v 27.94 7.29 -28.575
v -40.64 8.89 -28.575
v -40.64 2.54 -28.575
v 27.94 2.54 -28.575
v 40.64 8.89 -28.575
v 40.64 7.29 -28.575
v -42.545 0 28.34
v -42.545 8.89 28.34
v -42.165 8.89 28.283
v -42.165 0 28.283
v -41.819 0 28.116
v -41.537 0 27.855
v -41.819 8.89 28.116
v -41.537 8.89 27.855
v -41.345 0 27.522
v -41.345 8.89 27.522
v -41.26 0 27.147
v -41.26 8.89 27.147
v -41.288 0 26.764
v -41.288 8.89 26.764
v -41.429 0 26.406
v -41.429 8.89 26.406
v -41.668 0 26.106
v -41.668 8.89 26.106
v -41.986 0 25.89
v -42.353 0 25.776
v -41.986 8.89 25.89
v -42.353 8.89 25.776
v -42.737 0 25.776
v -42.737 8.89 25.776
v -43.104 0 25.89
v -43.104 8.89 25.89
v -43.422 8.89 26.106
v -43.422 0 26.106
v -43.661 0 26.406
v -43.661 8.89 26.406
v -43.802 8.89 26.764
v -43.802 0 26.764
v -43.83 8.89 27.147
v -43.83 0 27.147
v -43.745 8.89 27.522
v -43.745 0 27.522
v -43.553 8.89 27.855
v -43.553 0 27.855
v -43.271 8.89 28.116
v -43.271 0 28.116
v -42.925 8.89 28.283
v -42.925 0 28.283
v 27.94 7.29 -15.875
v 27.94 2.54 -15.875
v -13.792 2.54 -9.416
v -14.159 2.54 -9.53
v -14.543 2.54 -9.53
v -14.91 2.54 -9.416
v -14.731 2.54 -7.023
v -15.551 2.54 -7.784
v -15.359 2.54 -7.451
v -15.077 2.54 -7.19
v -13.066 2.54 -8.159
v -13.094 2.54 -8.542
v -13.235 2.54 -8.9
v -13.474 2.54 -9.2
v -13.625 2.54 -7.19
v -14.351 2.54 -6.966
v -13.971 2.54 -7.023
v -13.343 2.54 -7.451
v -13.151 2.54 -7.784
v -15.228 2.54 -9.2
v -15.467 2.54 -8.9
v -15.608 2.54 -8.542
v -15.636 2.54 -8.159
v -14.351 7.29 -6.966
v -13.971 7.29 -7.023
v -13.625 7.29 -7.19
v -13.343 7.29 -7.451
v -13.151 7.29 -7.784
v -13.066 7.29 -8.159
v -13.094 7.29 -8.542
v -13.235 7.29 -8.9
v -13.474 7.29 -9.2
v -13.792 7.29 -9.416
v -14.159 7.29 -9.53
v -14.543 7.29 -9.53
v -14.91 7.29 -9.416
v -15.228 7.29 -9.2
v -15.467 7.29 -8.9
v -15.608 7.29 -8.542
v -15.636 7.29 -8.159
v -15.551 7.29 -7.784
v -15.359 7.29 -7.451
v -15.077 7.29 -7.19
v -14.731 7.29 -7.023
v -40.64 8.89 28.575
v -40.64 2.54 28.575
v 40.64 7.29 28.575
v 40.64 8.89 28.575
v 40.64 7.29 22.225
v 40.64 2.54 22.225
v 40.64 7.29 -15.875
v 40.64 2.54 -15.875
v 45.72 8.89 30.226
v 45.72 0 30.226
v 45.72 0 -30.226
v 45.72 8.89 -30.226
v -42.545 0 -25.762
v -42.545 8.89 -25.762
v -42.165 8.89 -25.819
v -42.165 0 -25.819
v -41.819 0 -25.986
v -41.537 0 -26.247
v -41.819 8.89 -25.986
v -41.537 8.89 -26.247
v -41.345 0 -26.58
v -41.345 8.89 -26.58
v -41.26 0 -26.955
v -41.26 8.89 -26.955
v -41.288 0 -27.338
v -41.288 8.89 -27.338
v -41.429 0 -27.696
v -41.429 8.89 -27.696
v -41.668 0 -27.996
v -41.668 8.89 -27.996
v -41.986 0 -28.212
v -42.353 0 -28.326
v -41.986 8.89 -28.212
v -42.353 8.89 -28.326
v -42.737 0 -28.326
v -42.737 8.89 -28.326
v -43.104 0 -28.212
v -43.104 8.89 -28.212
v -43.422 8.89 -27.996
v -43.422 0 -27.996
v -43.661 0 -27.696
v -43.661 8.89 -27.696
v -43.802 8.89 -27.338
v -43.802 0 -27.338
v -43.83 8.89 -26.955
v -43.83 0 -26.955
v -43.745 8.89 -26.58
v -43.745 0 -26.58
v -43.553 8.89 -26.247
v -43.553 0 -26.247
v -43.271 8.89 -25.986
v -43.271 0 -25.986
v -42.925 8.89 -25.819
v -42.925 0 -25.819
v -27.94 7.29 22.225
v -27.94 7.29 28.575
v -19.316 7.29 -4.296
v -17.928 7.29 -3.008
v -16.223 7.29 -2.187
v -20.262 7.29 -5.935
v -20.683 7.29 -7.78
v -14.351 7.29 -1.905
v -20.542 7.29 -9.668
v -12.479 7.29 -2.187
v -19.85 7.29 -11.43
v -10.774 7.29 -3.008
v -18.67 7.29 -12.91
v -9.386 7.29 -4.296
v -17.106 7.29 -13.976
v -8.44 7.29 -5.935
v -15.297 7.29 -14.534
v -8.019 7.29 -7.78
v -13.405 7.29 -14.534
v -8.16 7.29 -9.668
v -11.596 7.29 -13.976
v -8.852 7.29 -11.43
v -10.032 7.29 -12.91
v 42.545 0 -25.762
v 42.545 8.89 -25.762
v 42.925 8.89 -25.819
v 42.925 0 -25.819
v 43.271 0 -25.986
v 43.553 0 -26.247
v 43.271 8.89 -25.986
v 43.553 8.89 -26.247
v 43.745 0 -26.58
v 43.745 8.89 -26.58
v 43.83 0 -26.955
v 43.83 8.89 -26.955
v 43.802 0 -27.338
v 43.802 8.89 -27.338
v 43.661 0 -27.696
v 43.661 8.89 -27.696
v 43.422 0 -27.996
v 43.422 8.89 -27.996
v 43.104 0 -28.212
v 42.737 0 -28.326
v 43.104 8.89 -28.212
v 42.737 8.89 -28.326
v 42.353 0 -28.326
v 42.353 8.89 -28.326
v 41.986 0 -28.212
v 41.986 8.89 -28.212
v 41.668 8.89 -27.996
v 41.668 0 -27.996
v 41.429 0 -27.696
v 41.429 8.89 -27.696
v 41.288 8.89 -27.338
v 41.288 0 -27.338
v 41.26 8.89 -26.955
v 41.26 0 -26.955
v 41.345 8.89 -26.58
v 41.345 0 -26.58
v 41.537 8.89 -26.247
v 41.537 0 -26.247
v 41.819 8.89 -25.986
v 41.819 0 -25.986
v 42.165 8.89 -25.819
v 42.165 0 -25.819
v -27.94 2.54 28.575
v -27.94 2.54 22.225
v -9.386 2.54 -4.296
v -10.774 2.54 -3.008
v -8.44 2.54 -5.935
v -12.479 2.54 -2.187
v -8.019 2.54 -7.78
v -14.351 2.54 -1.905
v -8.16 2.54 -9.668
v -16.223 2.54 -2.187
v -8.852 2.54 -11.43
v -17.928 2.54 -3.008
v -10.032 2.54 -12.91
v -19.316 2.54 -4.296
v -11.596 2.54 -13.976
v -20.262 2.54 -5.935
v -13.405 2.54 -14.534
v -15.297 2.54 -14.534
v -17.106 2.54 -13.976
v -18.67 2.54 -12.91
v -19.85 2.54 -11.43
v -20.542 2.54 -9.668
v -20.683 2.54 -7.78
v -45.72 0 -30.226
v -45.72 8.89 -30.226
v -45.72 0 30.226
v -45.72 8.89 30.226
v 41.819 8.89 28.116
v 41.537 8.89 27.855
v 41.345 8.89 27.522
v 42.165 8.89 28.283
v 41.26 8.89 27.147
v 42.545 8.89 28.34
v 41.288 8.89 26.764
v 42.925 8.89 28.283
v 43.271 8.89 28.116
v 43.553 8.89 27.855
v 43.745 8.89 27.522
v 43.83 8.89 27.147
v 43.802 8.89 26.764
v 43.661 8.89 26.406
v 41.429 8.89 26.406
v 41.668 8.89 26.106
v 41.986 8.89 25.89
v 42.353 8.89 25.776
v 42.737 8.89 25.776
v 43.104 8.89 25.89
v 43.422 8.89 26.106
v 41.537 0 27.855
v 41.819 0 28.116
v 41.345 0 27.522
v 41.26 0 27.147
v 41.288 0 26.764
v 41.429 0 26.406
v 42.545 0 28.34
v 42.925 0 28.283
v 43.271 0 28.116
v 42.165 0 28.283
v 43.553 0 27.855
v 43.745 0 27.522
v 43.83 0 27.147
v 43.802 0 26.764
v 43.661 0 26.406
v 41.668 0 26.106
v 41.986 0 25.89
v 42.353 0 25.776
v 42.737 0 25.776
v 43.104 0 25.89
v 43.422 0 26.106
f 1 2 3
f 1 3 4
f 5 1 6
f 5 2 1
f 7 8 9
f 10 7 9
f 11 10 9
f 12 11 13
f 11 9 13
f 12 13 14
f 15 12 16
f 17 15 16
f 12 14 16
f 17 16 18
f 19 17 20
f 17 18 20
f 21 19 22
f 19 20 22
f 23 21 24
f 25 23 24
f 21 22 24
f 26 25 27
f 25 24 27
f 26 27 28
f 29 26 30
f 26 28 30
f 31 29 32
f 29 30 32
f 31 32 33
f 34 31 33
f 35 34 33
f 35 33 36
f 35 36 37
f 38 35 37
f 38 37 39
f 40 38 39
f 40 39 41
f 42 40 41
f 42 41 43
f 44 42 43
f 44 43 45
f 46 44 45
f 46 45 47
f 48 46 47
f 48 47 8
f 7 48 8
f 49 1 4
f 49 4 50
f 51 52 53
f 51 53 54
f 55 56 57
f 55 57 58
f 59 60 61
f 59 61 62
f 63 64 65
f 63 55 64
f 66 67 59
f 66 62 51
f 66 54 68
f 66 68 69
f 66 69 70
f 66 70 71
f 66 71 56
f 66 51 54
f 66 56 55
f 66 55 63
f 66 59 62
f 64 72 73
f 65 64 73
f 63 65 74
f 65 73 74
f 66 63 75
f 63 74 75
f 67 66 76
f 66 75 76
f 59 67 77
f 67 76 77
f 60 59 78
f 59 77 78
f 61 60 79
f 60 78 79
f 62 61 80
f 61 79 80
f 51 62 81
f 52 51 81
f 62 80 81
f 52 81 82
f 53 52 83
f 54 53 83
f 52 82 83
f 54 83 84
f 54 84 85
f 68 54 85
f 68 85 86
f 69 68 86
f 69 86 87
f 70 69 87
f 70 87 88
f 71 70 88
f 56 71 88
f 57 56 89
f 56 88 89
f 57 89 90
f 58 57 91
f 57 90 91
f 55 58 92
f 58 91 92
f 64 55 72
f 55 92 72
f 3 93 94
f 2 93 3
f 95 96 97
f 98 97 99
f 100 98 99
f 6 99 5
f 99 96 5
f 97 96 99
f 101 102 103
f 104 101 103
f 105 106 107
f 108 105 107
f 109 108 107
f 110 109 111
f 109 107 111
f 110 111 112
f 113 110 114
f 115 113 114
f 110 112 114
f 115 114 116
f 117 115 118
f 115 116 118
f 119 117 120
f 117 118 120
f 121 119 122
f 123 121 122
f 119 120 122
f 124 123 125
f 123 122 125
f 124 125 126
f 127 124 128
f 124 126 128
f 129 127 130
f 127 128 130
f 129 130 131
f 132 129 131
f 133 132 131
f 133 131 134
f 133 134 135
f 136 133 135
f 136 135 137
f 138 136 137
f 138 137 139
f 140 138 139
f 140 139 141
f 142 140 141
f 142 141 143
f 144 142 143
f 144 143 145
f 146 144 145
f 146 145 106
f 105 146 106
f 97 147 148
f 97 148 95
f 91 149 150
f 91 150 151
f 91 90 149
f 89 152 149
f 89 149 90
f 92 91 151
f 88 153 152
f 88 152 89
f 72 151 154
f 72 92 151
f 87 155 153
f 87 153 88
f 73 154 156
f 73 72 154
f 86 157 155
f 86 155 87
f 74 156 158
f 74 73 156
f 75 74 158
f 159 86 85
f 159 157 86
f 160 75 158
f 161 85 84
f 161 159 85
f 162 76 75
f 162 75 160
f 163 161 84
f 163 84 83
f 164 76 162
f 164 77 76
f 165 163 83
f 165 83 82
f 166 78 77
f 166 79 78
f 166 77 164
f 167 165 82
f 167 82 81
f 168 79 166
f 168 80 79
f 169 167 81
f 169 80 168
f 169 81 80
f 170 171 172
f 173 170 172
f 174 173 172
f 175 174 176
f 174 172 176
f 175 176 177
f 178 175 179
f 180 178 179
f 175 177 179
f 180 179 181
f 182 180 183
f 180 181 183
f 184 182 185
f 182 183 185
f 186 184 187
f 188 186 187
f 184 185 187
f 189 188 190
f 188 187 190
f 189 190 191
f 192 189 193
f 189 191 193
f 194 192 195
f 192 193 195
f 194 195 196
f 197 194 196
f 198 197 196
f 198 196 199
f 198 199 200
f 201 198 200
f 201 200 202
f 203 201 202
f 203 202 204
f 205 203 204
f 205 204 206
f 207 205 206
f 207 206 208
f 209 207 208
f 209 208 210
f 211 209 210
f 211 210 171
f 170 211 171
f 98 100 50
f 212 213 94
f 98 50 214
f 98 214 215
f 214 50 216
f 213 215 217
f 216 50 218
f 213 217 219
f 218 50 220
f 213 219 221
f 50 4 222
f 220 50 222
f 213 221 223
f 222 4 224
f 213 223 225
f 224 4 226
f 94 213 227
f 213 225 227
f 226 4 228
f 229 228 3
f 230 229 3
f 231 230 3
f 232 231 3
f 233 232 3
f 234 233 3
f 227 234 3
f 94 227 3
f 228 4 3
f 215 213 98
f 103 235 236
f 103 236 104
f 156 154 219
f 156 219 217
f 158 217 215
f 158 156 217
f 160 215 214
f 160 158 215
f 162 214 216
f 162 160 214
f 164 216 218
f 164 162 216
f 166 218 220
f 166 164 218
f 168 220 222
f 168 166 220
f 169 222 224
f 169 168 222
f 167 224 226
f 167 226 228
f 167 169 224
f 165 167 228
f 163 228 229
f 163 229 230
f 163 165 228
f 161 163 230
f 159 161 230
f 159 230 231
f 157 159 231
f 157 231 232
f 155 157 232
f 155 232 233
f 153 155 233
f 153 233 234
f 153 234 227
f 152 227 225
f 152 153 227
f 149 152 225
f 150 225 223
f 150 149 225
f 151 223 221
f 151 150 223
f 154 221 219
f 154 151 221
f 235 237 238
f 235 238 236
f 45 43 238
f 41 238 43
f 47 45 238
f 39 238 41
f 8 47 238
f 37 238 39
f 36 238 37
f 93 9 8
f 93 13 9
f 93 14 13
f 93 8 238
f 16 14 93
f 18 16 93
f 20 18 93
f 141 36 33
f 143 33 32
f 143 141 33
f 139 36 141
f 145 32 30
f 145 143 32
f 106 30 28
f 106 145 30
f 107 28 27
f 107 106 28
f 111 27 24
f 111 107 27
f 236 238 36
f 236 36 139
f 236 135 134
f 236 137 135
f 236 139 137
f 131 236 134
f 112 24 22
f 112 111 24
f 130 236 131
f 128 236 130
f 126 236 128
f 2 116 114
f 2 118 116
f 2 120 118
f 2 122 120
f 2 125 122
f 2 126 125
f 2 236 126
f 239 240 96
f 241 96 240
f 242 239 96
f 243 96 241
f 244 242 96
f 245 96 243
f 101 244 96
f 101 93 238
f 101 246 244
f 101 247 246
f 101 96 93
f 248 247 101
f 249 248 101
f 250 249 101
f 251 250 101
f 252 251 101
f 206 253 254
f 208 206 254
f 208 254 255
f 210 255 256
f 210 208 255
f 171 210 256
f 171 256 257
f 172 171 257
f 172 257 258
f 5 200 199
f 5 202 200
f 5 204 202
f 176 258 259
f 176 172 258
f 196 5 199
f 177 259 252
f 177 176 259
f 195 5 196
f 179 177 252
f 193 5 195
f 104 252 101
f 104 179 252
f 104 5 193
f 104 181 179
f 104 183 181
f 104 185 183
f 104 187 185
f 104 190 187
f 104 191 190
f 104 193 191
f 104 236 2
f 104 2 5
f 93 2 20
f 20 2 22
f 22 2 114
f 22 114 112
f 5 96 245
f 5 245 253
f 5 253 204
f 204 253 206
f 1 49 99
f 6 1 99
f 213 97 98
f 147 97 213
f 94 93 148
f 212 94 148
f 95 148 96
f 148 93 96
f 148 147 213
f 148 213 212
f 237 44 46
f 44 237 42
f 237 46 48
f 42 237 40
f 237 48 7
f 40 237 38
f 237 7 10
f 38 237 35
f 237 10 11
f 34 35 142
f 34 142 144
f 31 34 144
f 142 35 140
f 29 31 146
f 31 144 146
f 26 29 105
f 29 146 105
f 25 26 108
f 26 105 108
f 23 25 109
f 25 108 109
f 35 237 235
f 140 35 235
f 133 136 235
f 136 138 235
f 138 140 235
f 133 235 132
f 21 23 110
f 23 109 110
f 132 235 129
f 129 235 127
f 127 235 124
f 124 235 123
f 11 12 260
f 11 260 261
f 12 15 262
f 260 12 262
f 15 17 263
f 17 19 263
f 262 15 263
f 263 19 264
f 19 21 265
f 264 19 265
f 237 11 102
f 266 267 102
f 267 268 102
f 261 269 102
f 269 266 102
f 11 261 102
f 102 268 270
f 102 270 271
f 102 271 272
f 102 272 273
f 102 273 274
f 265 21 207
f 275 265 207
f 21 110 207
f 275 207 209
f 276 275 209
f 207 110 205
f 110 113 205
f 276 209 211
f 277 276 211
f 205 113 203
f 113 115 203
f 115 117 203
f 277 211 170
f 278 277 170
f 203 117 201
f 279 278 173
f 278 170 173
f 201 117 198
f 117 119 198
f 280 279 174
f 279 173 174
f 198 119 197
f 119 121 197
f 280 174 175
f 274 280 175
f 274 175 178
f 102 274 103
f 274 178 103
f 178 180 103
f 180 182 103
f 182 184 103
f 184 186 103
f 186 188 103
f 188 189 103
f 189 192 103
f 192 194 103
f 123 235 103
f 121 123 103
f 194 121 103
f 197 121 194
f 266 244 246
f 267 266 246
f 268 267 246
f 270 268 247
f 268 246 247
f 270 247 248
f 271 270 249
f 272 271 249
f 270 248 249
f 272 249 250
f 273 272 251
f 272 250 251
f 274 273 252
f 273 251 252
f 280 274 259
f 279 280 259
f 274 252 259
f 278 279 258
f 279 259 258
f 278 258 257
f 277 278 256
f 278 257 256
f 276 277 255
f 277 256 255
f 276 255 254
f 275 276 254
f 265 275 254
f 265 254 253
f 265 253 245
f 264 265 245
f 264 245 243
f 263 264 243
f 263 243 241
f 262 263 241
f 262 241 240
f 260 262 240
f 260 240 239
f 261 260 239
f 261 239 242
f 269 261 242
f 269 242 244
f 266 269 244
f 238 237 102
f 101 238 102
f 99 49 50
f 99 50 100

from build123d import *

# Parameters (mm, degrees)
SKETCH1_W           = 91.44
SKETCH1_H           = 60.452
BOSS_EXTRUDE1_DEPTH = 8.89
SKETCH2_W           = 81.28
SKETCH2_H           = 57.15
CUT_EXTRUDE1_DEPTH  = 1.6002
SKETCH3_R           = 6.35
SKETCH3_R_2         = 1.28905
CUT_EXTRUDE2_DEPTH  = 4.7498
SKETCH4_R           = 1.28905
CUT_EXTRUDE3_DEPTH  = 56.524423239


with BuildPart() as part:
    # Sketch1 → Boss-Extrude1 (new body)
    with BuildSketch(Plane(origin=(0, 0, 0), x_dir=(1, 0, 0), z_dir=(0, 1, 0))):
        Rectangle(SKETCH1_W, SKETCH1_H)
    extrude(amount=BOSS_EXTRUDE1_DEPTH)

    # Sketch2 → Cut-Extrude1 (cut)
    with BuildSketch(Plane(origin=(0, 8.89, 0), x_dir=(1, 0, 0), z_dir=(0, 1, 0))):
        Rectangle(SKETCH2_W, SKETCH2_H)
    extrude(amount=-CUT_EXTRUDE1_DEPTH, mode=Mode.SUBTRACT)

    # Sketch3 → Cut-Extrude2 (cut)
    with BuildSketch(Plane(origin=(0, 7.2898, 0), x_dir=(1, 0, 0), z_dir=(0, 1, 0))):
        Polygon((-40.64, 28.575), (27.94, 28.575), (27.94, 15.875), (40.64, 15.875), (40.64, -22.225), (-27.94, -22.225), (-27.94, -28.575), (-40.64, -28.575), (-40.64, -22.225), align=None)
        with Locations(Location((-14.351, 8.255, 0), (0, 0, 270))):
            Circle(SKETCH3_R, mode=Mode.SUBTRACT)
        with Locations(Location((-14.351, 8.255, 0), (0, 0, 270))):
            Circle(SKETCH3_R_2)
    extrude(amount=-CUT_EXTRUDE2_DEPTH, mode=Mode.SUBTRACT)

    # Sketch4 → Cut-Extrude3 (cut, through all)
    with BuildSketch(Plane(origin=(0, 8.89, 0), x_dir=(1, 0, 0), z_dir=(0, 1, 0))):
        with Locations(Location((-42.545, 27.051, 0), (0, 0, 270))):
            Circle(SKETCH4_R)
        with Locations(Location((-42.545, -27.051, 0), (0, 0, 270))):
            Circle(SKETCH4_R)
        with Locations(Location((42.545, -27.051, 0), (0, 0, 270))):
            Circle(SKETCH4_R)
        with Locations(Location((42.545, 27.051, 0), (0, 0, 270))):
            Circle(SKETCH4_R)
    extrude(amount=-CUT_EXTRUDE3_DEPTH, mode=Mode.SUBTRACT)


solid = part.part
